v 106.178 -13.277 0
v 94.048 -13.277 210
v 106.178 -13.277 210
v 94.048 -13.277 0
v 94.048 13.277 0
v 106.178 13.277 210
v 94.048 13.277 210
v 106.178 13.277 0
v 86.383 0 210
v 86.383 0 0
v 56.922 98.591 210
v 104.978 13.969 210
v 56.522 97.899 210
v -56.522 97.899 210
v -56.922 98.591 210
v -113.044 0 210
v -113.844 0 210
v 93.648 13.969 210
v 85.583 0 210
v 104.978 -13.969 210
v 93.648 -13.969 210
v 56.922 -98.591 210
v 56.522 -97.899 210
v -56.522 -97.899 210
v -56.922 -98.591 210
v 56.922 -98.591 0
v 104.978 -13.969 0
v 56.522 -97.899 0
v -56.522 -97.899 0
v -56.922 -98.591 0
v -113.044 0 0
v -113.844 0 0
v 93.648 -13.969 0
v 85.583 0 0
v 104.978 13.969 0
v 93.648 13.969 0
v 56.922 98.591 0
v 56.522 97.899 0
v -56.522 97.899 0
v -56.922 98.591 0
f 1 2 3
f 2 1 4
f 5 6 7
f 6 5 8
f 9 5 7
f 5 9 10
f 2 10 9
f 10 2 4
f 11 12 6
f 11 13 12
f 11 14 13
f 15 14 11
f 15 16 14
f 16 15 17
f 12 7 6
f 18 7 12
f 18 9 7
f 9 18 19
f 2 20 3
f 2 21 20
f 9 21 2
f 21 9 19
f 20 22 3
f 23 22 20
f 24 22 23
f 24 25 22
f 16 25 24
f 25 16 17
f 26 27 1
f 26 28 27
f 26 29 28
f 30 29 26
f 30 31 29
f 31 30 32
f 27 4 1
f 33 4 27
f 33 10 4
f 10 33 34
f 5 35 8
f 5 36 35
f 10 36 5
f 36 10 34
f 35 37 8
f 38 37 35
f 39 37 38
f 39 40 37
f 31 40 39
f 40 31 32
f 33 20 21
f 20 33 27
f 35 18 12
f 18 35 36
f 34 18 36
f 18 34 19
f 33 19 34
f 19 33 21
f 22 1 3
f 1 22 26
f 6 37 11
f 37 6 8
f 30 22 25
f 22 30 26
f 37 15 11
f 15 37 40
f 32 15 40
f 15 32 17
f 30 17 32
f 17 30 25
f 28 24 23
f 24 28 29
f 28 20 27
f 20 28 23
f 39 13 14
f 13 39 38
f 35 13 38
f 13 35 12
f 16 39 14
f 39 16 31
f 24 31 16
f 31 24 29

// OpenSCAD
// file: printer-params.scad
d_nozzle = 0.8;
h_layer = 0.3;
z_limit = 210;
y_limit = 210;
// file: helper-functions.scad
// water injection port cavity
module water_injection_port_cavity(r) {
    cylinder(r=r, h=z_limit);
    translate([4*t_wall, 0, 0])
    cylinder(r=r, h=z_limit);
}

// water injection port walls
module water_injection_port(r_o, r_i) {
    difference() {
        cylinder(r=r_o, h=z_limit);

        // water injection port cavity
        water_injection_port_cavity(r_i);
    }
}

// keyhole for vasemode printing
module keyhole() {
    t_wall_clearance = 0.1;
    translate([0, -t_wall_clearance/2, 0])
    cube([y_limit/2, t_wall_clearance, z_limit]);
}

// HELPERS (used for rendering drain mesh)
// This work builds off @leemes design for a parametric net pot. Original work can be found at https://www.thingiverse.com/thing:790339 licensed under CC-BY-SA 3.0 https://creativecommons.org/licenses/by-sa/3.0/
module cyl_sect(r1, r2, h) {
    difference() {
        cylinder(r=r1, h=h);
        translate([0,0,0])
            cylinder(r=r2, h=h);
    }
}
module connect(r, w, h, phi) {
    rotate(phi, [0,0,1])
        translate([0,-w/2,0])
            cube([r,w,h]);
}
module make_bottom_holes(begin,end,pie_segments, diameter) {
    width_connections=3;
    translate([0,0,0])
    difference() {
        cyl_sect(r1=end*diameter, r2=begin*diameter, h=h_bottom_shell);
        for (i=[0:pie_segments]) {
            connect(r=diameter,
                    w=width_connections,
                    h=h_bottom_shell,
                    phi=i*360/pie_segments);
        }
    }
}
// file: design-params.scad
// printer parameters
include <printer-params.scad>

// design parameters
scale_factor = 1.0;

t_wall = d_nozzle;
t_wall_clearance = d_nozzle;

perimeter_buffer = 10;

d_buoy = (2*y_limit/sqrt(3) - perimeter_buffer)*scale_factor;

d_wicking_chamber = 50.8*scale_factor;
h_wicking_chamber = 60*scale_factor;

overhang_angle = 45;
h_conical_cavity = tan(overhang_angle)*(d_buoy/2-2*t_wall-d_wicking_chamber/2);
d_buoy_cavity = d_buoy-4*t_wall;
h_bottom_shell = 3*h_layer;

d_planter = d_buoy_cavity-2*t_wall_clearance;
d_planter_cavity = d_planter-2*t_wall;

d_water_injection_port_buoy = d_buoy/8;
d_water_injection_port_cavity_buoy = d_water_injection_port_buoy - 4*t_wall;
// main file
// design parameters
include <design-params.scad>
include <helper-functions.scad>

h_planter = z_limit*scale_factor;
d_drainpipe = 4*d_nozzle;

d_water_injection_port_cavity_planter = d_water_injection_port_buoy+2*t_wall_clearance;

d_water_injection_port_planter = d_water_injection_port_cavity_planter+2*t_wall;

// Hidden variables:
$fn=6;

// shell used to remove protruding water injection port walls
module invisible_shell() {
    difference() {
        cylinder(r=d_buoy/2+2*t_wall, h=h_planter);

        // hexagonal cavity
        cylinder(r=d_planter/2, h=h_planter);
    }
}

difference() {
    translate([d_buoy/2-d_water_injection_port_buoy/2, 0, 0])
    water_injection_port(r_o=d_water_injection_port_planter/2, r_i=d_water_injection_port_cavity_planter/2);

    // shell used to remove protruding water injection port walls
    invisible_shell(d_water_injection_port_planter);
}

// planter
difference() {
    cylinder(r=d_planter/2, h=h_planter);

    // water injection port cavity
    translate([d_buoy/2-d_water_injection_port_buoy/2, 0, 0])
    water_injection_port_cavity(d_water_injection_port_cavity_planter/2);

    // hexagonal cavity
    translate([0, 0, 0])
    cylinder(r=d_planter_cavity/2, h=h_planter);

    // hexagonal cavity for drainpipe
    cylinder(r=d_drainpipe/2, h=h_bottom_shell);
}
